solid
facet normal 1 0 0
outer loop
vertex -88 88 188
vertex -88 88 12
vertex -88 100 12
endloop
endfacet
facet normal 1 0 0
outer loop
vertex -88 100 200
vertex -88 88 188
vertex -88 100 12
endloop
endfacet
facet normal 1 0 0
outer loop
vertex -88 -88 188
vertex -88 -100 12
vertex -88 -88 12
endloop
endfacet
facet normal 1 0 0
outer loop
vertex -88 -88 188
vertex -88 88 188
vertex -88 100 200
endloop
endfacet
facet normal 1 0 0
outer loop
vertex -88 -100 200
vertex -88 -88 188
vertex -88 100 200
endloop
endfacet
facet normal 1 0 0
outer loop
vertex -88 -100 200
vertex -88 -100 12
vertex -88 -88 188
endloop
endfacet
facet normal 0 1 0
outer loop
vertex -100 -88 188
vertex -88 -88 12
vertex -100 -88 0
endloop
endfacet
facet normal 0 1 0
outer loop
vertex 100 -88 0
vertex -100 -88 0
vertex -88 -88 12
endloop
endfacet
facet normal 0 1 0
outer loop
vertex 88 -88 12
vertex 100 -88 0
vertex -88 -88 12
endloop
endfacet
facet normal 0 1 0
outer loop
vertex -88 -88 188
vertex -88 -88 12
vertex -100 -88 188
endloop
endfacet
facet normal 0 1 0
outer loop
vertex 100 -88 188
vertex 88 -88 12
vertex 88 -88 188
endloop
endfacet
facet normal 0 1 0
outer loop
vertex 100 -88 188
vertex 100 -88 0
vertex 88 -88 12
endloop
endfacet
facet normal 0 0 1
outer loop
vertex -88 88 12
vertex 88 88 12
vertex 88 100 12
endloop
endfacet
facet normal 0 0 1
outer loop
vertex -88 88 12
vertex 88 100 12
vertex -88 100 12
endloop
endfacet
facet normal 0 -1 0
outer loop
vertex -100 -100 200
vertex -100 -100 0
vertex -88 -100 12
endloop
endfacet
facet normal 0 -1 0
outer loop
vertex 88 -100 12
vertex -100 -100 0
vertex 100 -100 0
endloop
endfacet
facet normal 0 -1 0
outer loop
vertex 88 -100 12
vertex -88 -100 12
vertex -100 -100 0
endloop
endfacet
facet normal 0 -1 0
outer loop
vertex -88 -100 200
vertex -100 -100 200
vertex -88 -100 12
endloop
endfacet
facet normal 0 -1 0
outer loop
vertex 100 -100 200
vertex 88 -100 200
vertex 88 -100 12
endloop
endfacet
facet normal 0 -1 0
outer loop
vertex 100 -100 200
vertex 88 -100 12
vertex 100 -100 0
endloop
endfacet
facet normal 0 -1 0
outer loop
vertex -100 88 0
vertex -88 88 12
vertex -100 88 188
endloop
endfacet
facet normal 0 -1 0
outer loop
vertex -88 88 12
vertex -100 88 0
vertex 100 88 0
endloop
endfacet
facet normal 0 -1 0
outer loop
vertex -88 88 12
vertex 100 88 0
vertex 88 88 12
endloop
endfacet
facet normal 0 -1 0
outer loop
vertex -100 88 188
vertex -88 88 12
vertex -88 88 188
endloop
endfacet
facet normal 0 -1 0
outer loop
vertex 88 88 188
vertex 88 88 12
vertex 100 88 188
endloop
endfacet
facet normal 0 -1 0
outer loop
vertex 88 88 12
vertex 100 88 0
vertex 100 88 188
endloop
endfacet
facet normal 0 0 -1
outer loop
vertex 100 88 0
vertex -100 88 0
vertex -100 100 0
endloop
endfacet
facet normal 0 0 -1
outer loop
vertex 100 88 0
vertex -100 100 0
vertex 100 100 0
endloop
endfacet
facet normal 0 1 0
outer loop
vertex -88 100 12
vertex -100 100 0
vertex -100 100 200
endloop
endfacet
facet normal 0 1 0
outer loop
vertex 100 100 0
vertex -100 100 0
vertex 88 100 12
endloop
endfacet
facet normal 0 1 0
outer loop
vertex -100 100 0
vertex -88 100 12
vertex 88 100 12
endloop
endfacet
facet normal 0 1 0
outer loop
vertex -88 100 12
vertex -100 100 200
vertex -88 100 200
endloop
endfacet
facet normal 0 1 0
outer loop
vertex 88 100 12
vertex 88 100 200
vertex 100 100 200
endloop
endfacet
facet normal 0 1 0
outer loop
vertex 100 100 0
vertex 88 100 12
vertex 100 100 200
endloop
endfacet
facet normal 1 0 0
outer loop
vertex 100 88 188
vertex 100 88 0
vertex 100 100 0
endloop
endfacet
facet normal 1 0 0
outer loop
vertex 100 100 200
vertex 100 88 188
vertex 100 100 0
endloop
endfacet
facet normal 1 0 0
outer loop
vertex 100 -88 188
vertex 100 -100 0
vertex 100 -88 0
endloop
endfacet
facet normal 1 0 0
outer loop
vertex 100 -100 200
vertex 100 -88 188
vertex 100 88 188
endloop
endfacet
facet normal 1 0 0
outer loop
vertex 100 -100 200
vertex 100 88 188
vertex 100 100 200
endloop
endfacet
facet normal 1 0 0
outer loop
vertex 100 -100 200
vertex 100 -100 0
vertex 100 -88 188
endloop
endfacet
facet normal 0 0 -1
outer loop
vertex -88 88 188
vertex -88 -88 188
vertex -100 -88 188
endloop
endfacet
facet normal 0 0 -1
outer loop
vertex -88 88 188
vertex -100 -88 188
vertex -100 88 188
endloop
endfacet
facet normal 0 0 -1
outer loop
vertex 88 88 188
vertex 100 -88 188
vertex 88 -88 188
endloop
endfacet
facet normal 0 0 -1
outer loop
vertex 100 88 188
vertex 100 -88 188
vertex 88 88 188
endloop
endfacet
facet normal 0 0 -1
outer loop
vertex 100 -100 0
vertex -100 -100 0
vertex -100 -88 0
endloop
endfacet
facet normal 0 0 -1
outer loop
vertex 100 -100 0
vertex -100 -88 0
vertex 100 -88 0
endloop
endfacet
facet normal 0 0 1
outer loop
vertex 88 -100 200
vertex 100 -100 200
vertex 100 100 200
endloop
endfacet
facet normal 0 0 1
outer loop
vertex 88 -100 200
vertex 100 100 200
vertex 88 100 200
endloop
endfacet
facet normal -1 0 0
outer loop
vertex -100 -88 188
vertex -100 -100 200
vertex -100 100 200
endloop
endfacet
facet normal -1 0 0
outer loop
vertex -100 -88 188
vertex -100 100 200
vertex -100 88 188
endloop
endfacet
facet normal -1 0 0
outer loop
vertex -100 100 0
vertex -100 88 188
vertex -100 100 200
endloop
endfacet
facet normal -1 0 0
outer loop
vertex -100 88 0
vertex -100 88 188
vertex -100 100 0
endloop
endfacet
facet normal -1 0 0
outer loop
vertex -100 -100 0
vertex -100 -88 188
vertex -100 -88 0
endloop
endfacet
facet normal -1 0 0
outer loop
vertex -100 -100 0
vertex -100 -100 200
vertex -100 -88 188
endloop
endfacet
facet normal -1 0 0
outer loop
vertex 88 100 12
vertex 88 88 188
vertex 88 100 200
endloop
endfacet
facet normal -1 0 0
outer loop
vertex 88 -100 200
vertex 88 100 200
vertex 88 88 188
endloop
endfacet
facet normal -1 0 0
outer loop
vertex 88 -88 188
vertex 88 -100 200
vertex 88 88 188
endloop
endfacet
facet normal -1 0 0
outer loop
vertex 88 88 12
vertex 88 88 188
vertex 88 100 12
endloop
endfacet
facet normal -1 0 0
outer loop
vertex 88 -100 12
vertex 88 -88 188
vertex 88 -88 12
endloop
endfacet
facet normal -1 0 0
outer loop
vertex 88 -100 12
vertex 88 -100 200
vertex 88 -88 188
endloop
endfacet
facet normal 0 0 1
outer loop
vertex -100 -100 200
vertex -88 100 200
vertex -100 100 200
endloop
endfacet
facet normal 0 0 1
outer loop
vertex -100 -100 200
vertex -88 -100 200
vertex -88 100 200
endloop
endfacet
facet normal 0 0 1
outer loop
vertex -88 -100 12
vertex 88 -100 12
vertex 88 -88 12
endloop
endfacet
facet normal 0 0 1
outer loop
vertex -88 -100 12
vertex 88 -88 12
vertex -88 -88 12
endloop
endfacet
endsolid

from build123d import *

# Parameters (mm, degrees)
F1_DEPTH = 100
F2_W     = 176
F2_H     = 188
F3_DEPTH = 200.001


with BuildPart() as f1:
    # F0 (on Front) → F1 (new body, symmetric)
    with BuildSketch(Plane.XZ):
        Polygon((-88, 200), (-94, 200), (-94, 6), (94, 6), (94, 200), (88, 200), (88, 12), (-88, 12), align=None)
        Polygon((-100, 200), (-100, 0), (100, 0), (100, 200), (94, 200), (94, 6), (-94, 6), (-94, 200), align=None)
    extrude(amount=F1_DEPTH, both=True)

    # F2 (on face) → F3 (cut, through all)
    with BuildSketch(Plane.YZ.offset(100)):
        with Locations((0, 94)):
            Rectangle(F2_W, F2_H)
    extrude(amount=-F3_DEPTH, mode=Mode.SUBTRACT)


solid = f1.part
